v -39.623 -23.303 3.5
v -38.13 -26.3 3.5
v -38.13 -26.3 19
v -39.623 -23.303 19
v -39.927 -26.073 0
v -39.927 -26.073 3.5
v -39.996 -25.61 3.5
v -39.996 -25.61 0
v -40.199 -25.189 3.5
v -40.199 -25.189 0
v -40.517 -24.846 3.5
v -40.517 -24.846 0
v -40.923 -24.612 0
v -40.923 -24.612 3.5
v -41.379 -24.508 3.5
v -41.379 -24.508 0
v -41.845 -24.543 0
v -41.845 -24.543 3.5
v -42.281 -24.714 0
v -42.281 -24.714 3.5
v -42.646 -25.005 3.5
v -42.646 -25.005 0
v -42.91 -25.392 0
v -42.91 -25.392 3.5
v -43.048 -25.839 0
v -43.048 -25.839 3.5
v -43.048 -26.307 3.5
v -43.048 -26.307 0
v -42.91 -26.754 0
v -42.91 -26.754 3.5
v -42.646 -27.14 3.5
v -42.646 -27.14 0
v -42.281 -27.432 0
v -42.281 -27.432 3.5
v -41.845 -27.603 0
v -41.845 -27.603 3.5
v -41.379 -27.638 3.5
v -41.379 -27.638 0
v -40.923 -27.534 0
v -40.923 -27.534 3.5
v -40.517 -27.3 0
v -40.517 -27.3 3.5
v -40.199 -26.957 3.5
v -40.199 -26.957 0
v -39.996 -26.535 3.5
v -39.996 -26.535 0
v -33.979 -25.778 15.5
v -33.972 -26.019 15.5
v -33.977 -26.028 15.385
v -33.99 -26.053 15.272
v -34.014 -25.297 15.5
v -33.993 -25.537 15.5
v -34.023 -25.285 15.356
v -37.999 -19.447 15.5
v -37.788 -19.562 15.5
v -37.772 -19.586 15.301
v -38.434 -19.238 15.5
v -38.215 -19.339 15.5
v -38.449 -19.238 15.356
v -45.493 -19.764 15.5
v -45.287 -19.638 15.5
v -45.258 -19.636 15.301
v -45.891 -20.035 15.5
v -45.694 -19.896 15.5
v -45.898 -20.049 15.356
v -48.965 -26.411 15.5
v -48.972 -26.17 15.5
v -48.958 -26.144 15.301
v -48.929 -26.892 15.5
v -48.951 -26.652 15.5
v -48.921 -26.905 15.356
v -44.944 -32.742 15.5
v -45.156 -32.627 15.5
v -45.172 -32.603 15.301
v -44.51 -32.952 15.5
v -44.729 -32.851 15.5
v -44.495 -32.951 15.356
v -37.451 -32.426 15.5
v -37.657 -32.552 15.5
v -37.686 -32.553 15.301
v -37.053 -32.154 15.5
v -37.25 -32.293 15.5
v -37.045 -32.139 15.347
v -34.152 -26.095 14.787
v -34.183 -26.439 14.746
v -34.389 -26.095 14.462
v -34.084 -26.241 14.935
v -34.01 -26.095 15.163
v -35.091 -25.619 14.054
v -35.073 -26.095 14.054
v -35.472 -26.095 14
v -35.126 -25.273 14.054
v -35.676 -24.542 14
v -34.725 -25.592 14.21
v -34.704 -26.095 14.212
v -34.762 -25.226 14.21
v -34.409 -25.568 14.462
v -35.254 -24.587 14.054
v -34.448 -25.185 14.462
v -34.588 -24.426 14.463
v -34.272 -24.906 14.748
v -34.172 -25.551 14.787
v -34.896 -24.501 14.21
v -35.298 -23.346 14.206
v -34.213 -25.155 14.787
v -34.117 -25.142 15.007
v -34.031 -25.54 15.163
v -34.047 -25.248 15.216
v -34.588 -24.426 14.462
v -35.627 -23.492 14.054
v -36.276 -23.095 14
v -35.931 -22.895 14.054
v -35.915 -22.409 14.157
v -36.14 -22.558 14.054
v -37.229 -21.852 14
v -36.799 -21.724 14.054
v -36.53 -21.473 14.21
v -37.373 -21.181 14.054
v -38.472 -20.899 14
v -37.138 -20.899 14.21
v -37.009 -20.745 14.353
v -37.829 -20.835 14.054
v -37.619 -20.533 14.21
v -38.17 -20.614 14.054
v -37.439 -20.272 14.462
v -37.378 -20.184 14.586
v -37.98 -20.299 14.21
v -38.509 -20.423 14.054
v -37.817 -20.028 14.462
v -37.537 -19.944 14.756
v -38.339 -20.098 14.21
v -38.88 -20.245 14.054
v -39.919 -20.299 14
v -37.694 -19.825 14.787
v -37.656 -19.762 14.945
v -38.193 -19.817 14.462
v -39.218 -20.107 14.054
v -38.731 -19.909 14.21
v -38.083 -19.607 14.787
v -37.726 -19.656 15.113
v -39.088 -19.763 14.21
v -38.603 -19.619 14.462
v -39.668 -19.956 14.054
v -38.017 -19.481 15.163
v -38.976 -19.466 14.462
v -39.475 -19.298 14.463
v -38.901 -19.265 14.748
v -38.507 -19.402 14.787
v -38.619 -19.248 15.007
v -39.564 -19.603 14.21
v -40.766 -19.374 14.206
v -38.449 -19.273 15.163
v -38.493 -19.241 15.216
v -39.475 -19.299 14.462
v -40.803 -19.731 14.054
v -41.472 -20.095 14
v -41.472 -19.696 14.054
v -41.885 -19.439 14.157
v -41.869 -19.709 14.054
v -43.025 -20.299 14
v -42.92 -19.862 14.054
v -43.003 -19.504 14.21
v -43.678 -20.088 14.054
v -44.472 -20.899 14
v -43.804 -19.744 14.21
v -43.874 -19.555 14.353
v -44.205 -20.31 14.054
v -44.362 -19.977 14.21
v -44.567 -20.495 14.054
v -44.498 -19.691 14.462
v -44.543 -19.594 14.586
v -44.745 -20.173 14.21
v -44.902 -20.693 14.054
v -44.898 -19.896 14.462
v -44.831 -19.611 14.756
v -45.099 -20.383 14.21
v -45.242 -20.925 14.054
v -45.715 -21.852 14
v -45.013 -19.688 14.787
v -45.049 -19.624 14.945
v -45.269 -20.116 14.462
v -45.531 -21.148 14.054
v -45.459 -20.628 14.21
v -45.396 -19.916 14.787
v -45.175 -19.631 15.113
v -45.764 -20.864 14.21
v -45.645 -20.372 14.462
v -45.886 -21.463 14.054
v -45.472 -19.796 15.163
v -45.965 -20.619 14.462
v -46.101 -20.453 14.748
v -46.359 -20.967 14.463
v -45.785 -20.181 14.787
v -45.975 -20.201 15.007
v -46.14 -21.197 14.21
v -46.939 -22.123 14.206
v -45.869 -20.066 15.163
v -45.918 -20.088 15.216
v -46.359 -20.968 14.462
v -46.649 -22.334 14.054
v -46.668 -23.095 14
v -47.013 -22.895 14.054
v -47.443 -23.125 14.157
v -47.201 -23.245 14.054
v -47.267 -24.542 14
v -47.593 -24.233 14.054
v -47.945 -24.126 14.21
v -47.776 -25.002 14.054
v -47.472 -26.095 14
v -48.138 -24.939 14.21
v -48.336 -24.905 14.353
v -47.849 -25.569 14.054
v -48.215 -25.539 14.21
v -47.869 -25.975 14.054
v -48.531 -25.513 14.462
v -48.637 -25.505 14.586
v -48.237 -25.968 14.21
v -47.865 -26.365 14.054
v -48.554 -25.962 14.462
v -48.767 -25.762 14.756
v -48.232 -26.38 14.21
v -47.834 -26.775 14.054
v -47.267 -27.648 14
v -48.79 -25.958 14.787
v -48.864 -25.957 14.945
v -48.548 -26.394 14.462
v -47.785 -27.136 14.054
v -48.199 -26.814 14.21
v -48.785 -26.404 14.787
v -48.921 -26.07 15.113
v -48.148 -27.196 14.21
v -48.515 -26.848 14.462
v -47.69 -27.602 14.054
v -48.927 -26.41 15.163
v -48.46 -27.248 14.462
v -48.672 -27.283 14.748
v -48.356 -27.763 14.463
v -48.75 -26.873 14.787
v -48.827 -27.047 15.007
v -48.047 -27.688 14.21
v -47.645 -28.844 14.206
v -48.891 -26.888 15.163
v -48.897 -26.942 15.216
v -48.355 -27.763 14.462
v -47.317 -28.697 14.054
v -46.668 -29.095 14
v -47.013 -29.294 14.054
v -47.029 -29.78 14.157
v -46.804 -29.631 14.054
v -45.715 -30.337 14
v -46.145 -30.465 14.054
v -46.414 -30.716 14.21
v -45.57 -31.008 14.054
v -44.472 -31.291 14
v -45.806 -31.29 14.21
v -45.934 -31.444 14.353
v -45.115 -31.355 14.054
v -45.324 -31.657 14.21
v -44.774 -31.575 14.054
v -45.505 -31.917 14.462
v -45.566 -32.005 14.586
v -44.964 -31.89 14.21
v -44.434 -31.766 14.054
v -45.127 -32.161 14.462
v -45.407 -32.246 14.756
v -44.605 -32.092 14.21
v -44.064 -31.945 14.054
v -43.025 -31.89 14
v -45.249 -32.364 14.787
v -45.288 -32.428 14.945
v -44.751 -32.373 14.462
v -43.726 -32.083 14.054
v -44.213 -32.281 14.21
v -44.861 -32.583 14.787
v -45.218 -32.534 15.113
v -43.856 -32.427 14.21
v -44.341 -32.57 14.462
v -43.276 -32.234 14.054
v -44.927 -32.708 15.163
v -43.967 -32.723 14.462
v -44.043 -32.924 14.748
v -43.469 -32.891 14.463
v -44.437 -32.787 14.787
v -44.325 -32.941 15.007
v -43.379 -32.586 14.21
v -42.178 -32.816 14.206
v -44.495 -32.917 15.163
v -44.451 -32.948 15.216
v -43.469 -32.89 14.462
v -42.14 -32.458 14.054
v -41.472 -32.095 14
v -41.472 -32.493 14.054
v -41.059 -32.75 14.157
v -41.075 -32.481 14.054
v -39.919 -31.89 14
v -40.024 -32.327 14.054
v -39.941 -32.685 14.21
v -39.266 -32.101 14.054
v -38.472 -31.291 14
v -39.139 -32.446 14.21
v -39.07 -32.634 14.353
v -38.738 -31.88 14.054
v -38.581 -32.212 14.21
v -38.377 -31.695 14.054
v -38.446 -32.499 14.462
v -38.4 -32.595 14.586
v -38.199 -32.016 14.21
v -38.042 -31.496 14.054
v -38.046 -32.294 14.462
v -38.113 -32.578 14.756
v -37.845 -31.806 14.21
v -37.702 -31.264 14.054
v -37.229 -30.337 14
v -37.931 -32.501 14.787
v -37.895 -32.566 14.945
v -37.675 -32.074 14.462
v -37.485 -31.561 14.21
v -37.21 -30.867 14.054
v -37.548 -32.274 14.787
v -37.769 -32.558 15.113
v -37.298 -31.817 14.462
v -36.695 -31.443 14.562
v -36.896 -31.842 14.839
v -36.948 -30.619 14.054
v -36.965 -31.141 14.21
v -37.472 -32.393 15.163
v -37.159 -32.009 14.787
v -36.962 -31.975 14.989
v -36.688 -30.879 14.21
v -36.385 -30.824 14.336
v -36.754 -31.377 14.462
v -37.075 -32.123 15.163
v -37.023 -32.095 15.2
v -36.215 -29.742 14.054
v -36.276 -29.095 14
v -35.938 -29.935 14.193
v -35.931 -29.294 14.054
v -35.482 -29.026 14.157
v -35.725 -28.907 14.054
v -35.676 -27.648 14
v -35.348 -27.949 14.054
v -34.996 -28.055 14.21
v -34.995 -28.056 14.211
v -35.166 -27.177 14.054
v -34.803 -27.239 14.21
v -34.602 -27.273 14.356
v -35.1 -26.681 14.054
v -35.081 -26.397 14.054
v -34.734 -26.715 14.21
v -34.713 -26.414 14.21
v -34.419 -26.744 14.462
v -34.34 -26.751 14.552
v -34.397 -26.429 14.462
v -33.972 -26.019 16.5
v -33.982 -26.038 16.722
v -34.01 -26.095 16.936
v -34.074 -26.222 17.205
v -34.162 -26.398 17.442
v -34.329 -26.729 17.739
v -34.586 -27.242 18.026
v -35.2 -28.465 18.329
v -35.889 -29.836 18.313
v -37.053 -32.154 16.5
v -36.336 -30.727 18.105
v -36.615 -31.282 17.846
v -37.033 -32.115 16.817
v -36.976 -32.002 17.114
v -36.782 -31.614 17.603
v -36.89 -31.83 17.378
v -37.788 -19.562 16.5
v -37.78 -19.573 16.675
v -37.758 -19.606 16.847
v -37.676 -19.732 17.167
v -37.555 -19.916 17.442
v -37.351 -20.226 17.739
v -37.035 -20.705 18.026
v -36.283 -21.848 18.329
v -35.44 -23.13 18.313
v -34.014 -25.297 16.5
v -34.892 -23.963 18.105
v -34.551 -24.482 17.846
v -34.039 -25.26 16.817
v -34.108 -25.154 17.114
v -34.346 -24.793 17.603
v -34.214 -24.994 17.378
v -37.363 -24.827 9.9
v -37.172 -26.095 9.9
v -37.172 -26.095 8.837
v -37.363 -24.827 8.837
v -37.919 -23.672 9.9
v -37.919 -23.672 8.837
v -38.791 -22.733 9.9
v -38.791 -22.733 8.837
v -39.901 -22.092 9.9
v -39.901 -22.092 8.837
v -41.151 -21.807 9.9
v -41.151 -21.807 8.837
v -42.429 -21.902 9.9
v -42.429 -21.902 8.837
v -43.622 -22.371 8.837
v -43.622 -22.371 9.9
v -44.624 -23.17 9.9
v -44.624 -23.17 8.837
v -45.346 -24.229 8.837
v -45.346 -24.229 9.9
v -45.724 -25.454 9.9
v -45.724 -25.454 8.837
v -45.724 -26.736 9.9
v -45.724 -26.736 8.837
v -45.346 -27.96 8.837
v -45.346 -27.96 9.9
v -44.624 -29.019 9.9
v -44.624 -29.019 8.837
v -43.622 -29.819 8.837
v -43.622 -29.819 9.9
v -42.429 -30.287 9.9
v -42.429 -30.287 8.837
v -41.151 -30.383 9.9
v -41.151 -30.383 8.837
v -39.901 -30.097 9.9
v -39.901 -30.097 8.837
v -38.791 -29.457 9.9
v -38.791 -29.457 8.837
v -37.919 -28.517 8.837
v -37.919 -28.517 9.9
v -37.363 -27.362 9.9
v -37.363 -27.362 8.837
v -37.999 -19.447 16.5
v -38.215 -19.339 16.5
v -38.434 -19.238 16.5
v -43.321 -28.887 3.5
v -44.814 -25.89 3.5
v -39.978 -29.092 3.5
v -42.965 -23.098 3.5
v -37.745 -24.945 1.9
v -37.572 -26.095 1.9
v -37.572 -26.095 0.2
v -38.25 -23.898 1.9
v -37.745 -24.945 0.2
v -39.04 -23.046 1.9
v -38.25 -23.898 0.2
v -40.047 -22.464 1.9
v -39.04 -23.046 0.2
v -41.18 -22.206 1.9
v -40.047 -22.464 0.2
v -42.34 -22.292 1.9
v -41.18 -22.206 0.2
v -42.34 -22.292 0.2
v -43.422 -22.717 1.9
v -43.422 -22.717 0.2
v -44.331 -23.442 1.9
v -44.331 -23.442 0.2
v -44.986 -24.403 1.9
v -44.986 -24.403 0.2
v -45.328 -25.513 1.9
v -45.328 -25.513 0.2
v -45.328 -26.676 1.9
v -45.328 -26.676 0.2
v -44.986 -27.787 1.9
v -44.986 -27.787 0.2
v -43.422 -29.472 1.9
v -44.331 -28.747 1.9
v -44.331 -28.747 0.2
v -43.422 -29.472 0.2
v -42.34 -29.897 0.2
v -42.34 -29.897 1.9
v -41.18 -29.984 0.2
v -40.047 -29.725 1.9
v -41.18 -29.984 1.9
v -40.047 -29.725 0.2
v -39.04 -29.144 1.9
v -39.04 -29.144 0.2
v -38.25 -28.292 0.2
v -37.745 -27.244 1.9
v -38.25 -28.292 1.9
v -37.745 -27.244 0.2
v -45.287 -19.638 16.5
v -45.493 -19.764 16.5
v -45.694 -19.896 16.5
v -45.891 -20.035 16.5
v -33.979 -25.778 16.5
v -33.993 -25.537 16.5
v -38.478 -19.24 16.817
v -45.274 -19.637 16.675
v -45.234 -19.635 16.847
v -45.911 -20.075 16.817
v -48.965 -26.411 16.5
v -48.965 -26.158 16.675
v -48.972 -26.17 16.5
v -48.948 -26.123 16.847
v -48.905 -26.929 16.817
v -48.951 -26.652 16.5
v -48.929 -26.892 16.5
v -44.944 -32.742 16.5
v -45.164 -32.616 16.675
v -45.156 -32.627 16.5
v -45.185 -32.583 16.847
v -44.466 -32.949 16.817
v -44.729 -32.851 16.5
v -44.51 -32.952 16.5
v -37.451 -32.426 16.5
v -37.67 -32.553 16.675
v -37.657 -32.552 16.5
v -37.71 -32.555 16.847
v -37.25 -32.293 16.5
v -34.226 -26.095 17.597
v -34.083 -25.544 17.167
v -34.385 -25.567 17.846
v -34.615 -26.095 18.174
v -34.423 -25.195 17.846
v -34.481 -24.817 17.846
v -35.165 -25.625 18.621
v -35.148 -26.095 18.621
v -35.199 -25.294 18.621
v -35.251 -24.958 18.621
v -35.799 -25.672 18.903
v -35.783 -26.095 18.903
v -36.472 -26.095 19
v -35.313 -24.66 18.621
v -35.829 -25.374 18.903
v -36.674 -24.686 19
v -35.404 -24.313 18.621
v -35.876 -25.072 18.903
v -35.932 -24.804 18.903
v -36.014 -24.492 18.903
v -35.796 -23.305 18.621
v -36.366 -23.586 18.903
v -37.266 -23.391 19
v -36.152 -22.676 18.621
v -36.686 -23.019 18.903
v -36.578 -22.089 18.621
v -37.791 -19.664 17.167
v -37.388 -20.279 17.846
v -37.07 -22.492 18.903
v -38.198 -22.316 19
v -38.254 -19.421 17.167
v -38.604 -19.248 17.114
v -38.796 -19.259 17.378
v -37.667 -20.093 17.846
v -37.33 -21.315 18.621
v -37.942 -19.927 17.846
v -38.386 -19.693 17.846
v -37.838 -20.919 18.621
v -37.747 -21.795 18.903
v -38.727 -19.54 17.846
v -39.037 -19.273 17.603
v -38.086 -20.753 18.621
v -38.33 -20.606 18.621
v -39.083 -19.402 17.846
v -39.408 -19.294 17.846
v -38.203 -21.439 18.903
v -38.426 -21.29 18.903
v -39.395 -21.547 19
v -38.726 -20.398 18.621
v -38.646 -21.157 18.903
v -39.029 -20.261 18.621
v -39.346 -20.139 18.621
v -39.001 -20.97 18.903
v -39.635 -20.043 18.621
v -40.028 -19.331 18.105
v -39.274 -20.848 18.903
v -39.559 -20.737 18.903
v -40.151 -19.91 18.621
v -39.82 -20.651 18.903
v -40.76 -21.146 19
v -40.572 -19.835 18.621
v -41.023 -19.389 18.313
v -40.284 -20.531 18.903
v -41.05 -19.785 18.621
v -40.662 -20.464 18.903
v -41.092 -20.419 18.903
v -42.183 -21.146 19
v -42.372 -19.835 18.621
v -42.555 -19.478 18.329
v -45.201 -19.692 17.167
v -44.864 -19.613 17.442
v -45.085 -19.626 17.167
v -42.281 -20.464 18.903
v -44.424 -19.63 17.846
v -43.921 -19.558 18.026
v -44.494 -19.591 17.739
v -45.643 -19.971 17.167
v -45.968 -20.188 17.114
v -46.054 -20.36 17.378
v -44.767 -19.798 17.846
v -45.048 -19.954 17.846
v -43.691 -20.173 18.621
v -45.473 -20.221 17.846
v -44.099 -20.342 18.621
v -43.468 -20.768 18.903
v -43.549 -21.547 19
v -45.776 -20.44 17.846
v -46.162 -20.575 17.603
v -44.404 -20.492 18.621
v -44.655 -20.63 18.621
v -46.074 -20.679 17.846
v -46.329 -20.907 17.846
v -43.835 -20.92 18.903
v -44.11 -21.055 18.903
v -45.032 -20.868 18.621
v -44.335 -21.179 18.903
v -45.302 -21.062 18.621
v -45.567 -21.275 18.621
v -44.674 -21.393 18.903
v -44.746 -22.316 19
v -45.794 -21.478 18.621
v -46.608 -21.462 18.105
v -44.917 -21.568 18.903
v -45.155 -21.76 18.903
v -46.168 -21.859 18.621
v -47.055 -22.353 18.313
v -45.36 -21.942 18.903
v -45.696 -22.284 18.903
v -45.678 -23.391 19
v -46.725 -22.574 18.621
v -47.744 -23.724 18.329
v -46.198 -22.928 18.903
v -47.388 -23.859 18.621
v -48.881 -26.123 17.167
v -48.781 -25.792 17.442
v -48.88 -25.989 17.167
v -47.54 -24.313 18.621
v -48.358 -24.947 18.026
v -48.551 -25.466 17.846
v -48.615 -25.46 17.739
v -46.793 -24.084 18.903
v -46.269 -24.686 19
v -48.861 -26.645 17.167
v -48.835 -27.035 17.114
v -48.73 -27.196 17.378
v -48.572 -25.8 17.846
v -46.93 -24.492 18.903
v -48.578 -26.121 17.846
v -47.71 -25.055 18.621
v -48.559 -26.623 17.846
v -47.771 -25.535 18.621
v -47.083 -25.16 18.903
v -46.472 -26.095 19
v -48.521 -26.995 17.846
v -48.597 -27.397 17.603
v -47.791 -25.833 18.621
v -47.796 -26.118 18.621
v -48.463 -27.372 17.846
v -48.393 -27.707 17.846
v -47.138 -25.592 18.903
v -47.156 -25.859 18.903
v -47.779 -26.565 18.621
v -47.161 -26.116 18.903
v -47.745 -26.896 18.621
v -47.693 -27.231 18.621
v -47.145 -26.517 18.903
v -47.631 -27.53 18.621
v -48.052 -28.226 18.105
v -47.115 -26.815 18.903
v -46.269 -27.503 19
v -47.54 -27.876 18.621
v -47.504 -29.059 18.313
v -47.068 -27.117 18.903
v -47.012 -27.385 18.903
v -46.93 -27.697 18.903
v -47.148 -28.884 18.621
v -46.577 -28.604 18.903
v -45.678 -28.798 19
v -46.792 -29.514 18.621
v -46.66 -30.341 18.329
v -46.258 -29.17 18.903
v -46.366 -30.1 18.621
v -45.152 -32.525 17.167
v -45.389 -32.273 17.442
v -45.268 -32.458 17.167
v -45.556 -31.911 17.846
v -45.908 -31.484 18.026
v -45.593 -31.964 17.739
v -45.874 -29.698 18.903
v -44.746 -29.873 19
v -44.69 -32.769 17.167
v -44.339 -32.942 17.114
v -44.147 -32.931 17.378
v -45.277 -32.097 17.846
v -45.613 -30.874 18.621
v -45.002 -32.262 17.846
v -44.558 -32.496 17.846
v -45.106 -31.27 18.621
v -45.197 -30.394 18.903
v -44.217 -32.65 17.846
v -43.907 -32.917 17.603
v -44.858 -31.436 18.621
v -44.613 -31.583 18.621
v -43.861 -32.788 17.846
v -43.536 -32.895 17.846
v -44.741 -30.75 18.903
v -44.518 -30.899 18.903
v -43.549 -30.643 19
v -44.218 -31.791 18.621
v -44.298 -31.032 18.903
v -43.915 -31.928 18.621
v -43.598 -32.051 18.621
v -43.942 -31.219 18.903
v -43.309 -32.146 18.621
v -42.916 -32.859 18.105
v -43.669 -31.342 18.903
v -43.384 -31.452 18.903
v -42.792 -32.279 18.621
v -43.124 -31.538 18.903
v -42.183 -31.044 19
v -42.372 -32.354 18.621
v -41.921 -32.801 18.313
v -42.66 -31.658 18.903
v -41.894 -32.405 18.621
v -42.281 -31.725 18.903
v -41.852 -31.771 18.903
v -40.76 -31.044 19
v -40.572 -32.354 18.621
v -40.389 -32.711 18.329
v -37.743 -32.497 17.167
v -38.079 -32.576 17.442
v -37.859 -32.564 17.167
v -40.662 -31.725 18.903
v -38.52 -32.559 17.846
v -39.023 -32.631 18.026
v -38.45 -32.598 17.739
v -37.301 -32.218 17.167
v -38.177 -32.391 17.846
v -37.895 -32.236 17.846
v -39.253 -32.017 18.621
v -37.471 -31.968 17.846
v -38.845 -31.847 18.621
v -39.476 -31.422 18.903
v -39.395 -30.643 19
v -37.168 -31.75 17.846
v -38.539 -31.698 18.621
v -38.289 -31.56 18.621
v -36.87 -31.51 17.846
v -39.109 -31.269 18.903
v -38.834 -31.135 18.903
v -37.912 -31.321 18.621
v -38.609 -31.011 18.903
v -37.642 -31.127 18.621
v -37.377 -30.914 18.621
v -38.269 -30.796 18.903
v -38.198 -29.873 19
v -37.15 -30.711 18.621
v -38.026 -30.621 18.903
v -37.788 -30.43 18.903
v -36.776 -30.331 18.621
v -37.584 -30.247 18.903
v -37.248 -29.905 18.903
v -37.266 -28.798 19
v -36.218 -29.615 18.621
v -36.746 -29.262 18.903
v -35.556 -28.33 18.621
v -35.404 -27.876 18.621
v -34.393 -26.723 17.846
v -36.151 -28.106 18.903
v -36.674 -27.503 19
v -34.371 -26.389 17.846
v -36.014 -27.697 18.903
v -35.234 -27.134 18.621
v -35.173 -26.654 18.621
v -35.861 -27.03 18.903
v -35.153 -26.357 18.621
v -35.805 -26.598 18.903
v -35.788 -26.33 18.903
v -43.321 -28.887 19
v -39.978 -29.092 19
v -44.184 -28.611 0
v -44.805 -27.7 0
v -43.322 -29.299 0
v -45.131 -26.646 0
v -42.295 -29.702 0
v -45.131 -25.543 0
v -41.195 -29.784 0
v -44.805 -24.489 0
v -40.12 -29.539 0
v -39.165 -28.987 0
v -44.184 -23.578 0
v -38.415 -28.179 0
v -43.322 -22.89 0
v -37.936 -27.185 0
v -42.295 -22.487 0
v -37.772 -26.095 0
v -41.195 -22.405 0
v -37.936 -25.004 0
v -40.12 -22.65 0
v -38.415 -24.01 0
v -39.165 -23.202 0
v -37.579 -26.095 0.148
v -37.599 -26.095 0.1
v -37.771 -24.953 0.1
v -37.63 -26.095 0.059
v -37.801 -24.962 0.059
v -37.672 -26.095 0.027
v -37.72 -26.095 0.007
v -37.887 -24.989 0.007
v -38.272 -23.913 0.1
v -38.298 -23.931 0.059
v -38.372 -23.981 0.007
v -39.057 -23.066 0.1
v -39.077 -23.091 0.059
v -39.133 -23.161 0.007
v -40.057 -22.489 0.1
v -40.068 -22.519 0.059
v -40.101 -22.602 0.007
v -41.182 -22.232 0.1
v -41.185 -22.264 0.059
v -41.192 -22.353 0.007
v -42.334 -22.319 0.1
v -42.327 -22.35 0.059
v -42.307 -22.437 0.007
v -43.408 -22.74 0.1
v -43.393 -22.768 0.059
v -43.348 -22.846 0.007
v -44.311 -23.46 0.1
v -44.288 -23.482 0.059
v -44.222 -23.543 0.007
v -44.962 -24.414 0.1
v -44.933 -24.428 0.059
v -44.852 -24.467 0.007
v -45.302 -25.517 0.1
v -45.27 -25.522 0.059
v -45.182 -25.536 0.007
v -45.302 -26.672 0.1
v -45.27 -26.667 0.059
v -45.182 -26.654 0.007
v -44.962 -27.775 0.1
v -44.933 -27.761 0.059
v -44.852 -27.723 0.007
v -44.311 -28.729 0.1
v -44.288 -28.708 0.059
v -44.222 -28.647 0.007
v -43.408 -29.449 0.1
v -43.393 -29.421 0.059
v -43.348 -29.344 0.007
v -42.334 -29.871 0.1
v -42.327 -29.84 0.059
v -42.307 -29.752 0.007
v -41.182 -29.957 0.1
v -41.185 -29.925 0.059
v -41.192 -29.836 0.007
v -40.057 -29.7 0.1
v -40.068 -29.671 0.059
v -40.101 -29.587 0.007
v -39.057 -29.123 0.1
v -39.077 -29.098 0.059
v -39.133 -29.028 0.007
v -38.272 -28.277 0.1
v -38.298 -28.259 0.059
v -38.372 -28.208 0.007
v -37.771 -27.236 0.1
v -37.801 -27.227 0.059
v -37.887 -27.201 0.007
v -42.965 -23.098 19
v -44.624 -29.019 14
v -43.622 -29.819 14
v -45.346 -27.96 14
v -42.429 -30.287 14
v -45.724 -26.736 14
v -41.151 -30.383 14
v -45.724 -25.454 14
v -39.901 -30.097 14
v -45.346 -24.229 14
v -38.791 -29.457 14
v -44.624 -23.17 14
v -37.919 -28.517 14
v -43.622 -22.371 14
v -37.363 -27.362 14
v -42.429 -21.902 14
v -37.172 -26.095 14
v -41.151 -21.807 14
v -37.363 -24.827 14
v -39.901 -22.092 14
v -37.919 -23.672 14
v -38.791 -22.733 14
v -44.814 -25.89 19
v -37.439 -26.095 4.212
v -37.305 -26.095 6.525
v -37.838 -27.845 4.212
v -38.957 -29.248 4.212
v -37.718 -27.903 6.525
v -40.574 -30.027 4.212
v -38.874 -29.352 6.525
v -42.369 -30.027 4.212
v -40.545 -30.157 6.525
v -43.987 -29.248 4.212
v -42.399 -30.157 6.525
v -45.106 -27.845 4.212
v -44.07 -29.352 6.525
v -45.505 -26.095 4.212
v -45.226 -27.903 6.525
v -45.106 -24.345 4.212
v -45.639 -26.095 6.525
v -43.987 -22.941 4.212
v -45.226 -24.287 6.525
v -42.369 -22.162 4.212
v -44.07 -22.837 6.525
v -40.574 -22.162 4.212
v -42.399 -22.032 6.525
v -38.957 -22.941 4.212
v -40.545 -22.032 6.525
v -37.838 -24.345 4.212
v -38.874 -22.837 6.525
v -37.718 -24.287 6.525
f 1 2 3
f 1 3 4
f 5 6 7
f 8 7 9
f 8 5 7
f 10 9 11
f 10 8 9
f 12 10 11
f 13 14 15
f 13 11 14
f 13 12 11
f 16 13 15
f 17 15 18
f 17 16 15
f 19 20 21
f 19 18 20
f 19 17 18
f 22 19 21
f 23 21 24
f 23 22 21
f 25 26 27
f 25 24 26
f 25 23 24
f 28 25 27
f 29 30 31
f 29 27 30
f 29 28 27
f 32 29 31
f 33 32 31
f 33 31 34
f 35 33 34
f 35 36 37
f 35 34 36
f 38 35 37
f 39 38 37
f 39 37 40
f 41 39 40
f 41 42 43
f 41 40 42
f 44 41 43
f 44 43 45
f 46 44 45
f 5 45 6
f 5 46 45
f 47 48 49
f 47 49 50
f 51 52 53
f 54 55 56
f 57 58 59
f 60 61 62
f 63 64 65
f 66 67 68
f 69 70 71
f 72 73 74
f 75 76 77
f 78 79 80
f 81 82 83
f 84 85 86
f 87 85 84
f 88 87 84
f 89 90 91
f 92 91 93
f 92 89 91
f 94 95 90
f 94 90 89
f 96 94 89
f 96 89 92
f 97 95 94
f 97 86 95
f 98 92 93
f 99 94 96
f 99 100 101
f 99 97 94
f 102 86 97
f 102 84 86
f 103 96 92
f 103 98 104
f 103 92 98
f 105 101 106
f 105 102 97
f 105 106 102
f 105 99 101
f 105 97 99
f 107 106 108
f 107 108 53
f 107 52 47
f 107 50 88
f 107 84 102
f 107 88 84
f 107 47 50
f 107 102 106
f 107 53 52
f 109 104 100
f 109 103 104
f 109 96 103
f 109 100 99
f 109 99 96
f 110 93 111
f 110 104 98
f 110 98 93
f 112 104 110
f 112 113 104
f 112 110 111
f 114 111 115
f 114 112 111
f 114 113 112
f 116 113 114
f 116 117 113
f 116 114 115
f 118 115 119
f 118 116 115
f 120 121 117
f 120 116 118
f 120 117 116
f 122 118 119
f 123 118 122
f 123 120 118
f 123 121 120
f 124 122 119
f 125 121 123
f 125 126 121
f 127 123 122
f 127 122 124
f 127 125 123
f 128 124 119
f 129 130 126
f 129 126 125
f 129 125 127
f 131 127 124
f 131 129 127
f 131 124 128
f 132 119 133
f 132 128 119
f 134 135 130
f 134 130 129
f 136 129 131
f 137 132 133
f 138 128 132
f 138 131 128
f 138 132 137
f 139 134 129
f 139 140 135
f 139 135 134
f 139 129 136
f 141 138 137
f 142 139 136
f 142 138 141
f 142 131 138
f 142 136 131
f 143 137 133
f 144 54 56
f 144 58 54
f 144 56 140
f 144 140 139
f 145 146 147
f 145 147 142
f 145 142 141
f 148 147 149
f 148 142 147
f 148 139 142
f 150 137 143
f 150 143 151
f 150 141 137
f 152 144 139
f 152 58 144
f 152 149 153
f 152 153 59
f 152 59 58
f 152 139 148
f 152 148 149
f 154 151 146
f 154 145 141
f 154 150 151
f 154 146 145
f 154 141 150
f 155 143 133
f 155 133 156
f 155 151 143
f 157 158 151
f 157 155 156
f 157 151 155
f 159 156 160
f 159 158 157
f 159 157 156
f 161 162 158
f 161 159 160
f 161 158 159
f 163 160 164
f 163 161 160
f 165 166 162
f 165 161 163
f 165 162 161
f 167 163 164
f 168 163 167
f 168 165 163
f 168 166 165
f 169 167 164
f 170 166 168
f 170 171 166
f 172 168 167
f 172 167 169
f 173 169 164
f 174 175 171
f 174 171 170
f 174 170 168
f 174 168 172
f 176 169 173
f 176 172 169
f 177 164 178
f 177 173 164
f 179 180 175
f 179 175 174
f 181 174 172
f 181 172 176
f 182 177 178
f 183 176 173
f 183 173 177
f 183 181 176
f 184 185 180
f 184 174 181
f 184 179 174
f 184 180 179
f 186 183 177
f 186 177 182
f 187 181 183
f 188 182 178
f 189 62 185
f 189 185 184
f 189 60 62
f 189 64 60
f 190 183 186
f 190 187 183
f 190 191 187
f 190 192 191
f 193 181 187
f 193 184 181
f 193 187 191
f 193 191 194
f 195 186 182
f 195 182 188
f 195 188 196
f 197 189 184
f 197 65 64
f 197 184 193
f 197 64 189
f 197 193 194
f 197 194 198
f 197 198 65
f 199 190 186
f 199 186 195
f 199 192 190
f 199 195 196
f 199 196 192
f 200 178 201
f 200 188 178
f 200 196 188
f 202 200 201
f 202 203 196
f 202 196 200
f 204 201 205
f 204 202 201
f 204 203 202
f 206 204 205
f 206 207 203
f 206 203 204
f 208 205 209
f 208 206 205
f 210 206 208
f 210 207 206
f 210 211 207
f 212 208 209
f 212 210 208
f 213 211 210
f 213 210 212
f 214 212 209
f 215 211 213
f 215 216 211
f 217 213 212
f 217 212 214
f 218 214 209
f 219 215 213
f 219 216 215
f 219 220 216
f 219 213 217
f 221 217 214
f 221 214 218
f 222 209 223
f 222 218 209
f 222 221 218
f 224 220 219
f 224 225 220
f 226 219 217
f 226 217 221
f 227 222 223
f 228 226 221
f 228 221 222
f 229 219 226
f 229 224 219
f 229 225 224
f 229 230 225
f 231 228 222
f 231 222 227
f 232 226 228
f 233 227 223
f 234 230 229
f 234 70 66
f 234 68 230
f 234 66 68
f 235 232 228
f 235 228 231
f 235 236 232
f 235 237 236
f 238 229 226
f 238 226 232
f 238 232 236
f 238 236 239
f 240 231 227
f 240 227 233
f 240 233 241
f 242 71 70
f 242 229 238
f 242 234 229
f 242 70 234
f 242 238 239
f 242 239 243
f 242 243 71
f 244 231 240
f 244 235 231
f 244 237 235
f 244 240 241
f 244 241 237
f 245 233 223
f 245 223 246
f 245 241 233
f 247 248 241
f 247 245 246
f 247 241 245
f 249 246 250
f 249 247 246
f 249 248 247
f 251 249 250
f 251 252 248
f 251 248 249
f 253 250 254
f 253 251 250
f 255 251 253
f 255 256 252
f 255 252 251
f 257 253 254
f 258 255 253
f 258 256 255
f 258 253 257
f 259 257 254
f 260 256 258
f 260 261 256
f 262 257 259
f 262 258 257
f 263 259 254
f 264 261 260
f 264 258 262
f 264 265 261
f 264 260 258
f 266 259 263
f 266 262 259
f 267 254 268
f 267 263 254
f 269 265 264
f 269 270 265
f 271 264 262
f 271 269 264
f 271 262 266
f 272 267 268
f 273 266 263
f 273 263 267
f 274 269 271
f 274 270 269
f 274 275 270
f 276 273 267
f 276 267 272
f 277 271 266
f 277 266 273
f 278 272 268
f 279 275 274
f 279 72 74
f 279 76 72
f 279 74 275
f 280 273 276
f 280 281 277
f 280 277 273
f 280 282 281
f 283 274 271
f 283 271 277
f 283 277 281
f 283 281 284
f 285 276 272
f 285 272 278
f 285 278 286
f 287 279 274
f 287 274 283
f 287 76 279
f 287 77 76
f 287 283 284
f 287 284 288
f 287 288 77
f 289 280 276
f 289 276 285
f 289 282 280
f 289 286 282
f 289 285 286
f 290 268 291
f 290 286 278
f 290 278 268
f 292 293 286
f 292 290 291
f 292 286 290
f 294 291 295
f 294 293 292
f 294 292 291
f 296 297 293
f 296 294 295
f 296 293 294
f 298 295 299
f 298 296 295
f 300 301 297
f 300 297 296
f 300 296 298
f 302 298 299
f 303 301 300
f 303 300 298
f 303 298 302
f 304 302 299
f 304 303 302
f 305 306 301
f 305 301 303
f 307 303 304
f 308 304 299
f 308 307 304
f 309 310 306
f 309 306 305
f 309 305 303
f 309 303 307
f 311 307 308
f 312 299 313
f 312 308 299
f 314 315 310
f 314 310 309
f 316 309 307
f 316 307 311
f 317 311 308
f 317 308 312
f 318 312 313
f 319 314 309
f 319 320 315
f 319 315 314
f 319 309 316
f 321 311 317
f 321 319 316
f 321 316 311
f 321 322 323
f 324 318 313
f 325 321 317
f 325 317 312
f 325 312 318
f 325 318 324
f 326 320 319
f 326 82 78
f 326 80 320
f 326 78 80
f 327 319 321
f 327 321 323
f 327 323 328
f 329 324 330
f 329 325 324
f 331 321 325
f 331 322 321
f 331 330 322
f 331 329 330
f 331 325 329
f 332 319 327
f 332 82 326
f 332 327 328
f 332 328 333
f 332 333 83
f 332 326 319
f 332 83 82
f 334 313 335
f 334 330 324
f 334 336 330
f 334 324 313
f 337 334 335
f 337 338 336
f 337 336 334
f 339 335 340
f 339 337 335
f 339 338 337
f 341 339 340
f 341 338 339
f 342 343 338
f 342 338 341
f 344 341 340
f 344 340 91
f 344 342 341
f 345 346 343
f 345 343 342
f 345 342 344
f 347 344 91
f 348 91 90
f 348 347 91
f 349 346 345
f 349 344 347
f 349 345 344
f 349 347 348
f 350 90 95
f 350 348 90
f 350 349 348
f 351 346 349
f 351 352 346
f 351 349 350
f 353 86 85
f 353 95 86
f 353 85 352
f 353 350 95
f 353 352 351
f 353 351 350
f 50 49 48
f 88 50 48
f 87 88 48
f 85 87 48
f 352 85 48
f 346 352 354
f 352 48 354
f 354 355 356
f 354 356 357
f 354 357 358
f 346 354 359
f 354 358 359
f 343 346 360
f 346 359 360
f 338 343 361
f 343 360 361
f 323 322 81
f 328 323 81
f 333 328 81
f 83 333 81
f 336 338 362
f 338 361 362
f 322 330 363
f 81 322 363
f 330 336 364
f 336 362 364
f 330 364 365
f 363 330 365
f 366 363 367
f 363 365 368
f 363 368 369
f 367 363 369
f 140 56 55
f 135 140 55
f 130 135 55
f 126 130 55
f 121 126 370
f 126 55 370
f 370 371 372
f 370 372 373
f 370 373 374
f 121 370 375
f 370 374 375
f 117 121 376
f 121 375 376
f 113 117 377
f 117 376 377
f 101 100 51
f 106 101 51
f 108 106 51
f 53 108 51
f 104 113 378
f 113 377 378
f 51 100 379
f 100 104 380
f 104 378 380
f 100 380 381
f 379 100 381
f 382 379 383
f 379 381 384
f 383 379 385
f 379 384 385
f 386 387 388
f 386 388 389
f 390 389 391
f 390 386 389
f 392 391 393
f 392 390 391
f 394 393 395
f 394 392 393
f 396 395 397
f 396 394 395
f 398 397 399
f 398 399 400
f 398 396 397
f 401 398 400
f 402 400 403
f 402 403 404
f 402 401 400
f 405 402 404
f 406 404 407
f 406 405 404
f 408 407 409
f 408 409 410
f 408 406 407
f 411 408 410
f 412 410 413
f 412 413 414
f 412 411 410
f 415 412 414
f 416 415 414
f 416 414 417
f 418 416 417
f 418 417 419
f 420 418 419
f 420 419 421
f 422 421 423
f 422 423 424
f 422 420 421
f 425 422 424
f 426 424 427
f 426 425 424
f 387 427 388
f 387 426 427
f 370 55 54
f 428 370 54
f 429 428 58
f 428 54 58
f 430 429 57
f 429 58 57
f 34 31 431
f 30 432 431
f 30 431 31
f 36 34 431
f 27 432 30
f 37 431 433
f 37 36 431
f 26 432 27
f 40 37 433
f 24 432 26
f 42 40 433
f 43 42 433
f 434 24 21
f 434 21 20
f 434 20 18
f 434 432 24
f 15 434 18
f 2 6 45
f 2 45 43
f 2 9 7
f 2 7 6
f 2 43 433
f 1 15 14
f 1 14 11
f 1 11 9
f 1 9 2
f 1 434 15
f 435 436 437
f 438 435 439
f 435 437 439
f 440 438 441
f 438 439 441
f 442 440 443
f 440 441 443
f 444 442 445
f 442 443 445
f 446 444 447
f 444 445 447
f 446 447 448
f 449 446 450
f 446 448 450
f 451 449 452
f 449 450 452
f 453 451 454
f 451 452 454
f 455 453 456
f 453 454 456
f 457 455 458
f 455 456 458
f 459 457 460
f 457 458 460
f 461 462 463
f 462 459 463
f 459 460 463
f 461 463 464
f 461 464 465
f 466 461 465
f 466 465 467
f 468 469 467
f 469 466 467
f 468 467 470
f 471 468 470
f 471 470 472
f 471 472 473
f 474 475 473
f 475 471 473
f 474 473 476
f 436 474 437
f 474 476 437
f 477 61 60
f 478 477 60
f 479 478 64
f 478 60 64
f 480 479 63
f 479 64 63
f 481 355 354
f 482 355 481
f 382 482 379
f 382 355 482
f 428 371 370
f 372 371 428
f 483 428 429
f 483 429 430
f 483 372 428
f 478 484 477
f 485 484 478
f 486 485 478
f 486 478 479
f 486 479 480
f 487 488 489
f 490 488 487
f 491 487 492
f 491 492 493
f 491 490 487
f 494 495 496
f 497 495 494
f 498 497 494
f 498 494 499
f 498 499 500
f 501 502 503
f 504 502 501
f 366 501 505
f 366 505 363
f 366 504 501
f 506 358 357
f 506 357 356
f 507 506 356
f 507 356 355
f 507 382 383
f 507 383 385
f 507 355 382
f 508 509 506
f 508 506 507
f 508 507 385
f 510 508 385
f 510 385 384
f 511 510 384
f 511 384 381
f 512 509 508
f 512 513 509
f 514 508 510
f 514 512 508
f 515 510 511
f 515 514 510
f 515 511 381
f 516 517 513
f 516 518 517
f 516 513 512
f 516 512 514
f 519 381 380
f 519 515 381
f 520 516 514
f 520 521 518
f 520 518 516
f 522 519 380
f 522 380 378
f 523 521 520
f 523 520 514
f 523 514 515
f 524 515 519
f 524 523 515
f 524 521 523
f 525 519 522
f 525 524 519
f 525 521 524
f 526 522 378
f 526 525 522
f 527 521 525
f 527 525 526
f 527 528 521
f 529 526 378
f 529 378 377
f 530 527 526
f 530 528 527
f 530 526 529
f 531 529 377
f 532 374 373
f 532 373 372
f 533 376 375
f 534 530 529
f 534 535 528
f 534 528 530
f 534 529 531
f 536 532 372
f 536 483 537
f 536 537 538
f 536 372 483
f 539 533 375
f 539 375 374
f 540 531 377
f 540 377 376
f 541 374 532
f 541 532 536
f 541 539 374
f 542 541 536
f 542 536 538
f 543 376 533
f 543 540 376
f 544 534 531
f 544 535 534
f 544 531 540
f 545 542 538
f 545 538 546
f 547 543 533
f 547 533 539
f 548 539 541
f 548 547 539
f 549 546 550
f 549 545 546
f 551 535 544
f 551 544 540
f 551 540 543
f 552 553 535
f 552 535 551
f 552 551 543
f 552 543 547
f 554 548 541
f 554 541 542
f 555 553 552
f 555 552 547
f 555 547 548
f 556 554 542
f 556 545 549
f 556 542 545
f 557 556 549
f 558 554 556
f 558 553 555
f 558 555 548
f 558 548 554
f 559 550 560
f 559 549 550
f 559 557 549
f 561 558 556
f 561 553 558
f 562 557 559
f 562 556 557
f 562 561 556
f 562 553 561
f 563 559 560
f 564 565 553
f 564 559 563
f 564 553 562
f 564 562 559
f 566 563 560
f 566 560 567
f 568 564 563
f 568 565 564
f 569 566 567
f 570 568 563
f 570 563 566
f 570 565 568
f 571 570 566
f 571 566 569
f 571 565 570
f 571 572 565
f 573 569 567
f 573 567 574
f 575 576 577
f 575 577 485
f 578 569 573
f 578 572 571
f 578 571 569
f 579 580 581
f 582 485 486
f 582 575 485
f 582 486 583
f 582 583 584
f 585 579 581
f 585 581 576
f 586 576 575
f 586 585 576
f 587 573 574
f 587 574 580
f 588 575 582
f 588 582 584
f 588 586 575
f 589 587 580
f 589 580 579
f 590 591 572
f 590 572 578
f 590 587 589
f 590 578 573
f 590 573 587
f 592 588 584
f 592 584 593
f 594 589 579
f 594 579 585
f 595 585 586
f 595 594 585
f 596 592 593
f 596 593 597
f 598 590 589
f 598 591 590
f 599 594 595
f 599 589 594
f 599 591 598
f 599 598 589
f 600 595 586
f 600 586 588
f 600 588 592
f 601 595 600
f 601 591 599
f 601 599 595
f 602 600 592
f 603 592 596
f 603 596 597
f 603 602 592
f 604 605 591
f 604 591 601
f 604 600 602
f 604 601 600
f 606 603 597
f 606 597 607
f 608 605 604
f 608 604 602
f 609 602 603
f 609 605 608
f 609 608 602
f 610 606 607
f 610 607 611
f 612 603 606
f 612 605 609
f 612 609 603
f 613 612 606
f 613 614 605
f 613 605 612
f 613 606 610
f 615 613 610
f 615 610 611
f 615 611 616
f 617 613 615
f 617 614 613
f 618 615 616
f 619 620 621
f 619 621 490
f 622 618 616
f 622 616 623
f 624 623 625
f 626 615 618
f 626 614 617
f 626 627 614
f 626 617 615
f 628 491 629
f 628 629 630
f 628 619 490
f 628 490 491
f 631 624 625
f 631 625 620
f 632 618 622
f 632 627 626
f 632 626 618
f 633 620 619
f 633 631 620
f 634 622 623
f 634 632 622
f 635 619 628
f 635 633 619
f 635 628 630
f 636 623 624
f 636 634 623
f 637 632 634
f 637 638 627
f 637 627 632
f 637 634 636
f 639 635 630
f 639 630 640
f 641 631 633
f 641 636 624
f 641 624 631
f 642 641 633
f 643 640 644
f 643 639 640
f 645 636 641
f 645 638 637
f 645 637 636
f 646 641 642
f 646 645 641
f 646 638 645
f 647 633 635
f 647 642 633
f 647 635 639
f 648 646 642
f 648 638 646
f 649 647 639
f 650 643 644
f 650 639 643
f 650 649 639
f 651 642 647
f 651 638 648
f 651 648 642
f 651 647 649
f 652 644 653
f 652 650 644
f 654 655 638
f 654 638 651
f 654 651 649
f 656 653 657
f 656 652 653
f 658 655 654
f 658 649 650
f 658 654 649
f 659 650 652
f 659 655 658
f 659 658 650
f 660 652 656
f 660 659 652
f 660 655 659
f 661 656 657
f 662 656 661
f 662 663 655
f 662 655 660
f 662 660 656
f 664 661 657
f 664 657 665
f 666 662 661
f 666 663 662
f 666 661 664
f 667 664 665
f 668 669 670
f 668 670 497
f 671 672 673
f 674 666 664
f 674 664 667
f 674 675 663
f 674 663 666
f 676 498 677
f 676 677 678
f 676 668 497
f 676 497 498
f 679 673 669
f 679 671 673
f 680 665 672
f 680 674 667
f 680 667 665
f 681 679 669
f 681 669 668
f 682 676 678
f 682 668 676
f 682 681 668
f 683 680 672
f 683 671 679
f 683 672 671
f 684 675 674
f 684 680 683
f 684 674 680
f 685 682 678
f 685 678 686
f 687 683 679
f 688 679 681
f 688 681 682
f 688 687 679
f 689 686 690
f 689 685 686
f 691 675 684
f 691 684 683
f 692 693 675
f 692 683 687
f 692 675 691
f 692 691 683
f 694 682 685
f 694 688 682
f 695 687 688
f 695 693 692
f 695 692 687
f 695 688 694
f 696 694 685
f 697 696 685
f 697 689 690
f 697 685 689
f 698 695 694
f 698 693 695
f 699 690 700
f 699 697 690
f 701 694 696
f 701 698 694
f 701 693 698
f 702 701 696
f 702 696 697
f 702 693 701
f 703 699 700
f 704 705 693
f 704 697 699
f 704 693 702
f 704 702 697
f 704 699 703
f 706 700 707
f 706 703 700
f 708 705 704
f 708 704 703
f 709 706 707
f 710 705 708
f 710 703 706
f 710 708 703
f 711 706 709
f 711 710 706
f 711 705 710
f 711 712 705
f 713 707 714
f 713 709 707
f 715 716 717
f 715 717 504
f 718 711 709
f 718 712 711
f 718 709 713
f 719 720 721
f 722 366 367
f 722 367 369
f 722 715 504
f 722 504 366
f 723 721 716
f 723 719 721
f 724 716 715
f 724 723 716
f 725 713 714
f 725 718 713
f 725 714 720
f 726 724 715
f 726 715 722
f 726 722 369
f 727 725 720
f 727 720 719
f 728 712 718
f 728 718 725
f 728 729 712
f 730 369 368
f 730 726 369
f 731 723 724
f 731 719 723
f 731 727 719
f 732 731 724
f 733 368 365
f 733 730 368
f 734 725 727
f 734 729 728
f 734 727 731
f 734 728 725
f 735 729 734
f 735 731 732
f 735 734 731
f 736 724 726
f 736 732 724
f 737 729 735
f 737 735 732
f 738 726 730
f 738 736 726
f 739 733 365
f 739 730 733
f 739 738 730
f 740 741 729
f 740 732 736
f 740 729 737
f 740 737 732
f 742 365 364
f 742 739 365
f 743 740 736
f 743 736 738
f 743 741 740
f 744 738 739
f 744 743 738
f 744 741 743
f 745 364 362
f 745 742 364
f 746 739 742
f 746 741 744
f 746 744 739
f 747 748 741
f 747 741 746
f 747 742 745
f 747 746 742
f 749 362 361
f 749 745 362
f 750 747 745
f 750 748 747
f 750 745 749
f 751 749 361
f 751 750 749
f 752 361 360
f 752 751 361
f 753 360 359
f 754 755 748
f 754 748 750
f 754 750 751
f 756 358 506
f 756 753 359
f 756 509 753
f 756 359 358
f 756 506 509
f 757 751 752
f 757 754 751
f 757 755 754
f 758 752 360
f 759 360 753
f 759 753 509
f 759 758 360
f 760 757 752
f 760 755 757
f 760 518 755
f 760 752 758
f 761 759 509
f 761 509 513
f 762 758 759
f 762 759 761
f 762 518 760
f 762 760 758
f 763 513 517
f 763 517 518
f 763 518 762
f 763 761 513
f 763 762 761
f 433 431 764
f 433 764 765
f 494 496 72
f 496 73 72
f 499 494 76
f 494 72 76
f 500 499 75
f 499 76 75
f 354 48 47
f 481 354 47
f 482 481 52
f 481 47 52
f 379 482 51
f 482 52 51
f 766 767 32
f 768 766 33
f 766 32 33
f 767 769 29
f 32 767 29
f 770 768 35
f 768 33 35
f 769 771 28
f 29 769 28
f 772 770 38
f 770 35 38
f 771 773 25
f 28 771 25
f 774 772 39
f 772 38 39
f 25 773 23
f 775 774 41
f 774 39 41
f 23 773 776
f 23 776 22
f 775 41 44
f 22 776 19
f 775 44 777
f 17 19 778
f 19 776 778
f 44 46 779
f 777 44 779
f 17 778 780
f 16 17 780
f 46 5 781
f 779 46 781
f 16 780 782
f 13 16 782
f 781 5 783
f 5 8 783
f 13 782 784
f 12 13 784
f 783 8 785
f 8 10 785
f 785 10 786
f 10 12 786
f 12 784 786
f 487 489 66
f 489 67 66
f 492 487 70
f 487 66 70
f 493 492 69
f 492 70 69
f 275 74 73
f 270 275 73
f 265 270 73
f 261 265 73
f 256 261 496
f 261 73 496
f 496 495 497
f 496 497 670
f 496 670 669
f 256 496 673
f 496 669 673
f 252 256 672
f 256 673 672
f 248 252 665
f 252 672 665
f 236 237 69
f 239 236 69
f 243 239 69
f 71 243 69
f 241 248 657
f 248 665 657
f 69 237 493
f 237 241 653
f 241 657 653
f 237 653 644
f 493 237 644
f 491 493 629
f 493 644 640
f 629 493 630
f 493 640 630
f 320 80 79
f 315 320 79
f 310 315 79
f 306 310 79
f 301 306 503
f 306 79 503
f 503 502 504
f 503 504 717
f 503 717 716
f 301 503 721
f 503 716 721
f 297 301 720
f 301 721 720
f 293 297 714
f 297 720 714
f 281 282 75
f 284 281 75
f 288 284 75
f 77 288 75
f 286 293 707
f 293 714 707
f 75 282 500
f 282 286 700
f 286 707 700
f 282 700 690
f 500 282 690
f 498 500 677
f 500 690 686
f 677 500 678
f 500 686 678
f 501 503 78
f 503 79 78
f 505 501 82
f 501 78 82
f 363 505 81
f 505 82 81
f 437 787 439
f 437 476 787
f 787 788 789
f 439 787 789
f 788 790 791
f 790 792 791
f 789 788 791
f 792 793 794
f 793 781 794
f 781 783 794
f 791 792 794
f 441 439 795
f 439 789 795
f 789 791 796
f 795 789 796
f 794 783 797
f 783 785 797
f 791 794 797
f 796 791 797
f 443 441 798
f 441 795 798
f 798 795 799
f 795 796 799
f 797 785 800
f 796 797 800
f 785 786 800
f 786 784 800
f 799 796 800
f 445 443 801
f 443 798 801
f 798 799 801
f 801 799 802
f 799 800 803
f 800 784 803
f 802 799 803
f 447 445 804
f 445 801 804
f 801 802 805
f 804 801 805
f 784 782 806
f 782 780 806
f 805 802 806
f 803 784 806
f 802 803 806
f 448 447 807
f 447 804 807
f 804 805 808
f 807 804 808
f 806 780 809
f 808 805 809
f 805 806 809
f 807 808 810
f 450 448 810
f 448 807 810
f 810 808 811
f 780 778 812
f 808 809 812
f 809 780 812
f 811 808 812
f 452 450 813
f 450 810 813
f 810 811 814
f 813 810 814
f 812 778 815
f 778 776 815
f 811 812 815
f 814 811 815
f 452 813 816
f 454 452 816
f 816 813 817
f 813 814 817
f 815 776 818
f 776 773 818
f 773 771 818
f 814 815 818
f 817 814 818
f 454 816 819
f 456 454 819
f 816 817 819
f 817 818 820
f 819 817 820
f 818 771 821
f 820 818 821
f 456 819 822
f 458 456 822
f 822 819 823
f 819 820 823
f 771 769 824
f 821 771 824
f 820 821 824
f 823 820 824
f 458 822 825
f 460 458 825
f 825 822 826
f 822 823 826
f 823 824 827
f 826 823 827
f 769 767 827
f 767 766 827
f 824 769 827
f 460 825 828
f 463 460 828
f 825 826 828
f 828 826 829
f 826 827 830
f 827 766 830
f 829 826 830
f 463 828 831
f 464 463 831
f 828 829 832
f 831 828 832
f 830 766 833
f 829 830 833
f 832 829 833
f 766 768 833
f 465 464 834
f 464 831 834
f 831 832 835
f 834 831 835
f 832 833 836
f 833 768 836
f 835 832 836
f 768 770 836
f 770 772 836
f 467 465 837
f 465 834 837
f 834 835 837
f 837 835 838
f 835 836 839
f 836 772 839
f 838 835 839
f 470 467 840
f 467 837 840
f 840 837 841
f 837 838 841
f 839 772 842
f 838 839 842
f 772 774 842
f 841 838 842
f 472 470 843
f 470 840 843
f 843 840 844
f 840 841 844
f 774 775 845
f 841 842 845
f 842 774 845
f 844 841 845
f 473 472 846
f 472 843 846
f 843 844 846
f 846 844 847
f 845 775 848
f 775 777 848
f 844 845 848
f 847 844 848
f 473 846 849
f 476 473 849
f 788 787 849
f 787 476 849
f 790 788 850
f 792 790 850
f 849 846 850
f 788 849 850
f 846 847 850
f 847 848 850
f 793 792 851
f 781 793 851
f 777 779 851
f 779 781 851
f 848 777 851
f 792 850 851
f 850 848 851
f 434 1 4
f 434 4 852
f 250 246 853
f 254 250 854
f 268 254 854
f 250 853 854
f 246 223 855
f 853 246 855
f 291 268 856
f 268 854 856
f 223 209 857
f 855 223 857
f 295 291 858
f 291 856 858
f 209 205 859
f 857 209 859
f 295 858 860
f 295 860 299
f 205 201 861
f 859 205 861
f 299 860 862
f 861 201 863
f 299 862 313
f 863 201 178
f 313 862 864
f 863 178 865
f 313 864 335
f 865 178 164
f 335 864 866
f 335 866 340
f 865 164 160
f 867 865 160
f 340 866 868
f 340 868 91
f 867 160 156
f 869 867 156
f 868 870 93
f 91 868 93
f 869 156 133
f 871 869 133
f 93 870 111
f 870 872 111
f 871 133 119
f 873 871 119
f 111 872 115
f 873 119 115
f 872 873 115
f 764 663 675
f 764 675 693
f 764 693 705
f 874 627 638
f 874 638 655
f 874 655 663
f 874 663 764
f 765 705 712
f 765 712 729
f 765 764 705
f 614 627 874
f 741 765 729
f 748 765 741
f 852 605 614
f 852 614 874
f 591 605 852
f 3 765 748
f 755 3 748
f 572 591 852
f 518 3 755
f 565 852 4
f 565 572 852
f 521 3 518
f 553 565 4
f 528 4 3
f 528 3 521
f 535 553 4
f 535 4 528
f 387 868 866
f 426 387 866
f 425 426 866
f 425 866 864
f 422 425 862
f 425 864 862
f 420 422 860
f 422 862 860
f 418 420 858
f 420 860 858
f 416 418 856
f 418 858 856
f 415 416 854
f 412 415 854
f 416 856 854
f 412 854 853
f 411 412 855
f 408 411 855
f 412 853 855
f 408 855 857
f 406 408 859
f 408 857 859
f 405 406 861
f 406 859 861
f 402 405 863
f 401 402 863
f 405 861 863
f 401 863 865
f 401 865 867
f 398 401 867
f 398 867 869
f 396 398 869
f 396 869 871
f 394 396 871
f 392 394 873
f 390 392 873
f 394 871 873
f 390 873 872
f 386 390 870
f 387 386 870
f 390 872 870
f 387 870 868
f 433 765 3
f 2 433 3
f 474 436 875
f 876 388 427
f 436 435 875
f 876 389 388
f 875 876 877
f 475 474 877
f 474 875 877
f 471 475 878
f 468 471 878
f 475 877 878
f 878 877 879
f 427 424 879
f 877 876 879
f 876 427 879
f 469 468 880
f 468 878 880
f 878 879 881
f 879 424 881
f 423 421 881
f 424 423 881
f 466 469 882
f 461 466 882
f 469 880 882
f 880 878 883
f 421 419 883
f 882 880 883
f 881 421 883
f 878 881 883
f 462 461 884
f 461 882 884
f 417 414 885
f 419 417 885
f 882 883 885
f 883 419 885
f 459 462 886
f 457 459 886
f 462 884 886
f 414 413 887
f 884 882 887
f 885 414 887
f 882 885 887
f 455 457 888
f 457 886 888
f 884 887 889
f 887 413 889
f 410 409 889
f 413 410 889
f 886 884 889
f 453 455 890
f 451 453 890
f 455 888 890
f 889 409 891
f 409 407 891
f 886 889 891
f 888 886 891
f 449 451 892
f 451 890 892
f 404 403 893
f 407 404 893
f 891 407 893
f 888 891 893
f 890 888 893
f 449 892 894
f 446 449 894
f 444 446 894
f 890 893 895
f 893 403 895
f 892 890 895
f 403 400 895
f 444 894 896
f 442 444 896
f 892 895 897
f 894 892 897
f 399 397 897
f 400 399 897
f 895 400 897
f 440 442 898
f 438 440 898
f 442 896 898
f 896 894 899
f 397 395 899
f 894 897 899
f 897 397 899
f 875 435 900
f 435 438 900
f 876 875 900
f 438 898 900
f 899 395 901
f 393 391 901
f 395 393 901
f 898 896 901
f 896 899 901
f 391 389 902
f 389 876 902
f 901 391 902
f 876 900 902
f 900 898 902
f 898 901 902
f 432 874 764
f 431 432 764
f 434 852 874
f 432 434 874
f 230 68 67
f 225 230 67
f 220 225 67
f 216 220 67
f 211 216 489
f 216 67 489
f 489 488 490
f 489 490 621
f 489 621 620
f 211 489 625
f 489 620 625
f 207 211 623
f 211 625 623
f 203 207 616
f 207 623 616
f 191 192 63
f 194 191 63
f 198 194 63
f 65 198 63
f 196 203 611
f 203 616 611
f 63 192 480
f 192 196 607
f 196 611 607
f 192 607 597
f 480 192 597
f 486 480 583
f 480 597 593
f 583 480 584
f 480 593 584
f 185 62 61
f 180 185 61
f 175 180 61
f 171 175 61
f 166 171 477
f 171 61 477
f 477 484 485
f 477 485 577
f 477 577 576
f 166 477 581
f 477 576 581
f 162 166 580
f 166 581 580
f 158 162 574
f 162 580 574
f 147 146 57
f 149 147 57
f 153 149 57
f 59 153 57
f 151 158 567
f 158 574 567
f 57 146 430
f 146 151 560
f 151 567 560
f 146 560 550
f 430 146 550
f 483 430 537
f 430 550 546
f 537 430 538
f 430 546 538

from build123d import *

# Parameters (mm, degrees)
F0_R         = 3.9
F2_DEPTH     = 14
F3_R         = 7.5
F4_DEPTH     = 5
F6_R         = 4.3
F7_DEPTH     = 4.1
F1_R         = 1.5693660879
F8_DEPTH     = 23.4
F9_DEPTH     = 15.5
F10_R        = 0.2
F11_S5_R     = 4.3
F11_T6_DEPTH = 9
F12_R        = 1.5
F13_R        = 2.5
F15_R        = 8.6051956913
F16_DEPTH    = 6


# Not quite as in the source:
# - a fillet or chamfer that OpenCascade refuses, or shapes differently, is made with other operations: its cross-section is extruded or revolved along the edge and cut away or added


with BuildPart() as f2:
    # F0 (on Top) → F2 (new body)
    with BuildSketch(Plane.XY):
        with Locations((-41.4718948305, -26.0946750641)):
            Circle(F0_R)
    extrude(amount=F2_DEPTH)

    # F3 (on face) → F4 (join)
    with BuildSketch(Plane.XY.offset(14)):
        with Locations((-41.4718948305, -26.0946750641)):
            Circle(F3_R)
    extrude(amount=F4_DEPTH)

    # F6 (on face) → F7 (join)
    with BuildSketch(Plane(origin=(0, 0, 14), x_dir=(1, 0, 0), z_dir=(0, 0, -1))):
        with Locations((-41.4718948305, 26.0946750641)):
            Circle(F6_R)
    extrude(amount=F7_DEPTH)

    # F1 (on Top) → F8 (cut)
    with BuildSketch(Plane.XY):
        with Locations((-41.495975107, -26.0728988796)):
            Circle(F1_R)
    extrude(amount=F8_DEPTH, mode=Mode.SUBTRACT)

    # F5 (on face) → F9 (cut)
    with BuildSketch(Plane.XY.offset(19)):
        Polygon((-39.9783341683, -29.0917753096), (-38.1295495491, -26.2997637113), (-39.6231102113, -23.3026634658), (-42.9654554927, -23.0975748186), (-44.8142401119, -25.8895864169), (-43.3206794497, -28.8866866624), align=None)
    extrude(amount=-F9_DEPTH, mode=Mode.SUBTRACT)

    # F10
    f10_edges = [f2.edges().sort_by_distance(p)[0] for p in [
        (-45.371895, -26.094675, 0),
    ]]
    fillet(f10_edges, radius=F10_R)

    # F11: chamfer of 8 x 0.4612770977 on 1 edges, made by hand


with BuildPart() as f11_tool2:
    # F11_s3 → F11_t4 (revolve)
    with BuildSketch(Plane.XZ.offset(26.0946750641)):
        Polygon((-37.5718948305, 1.9), (-37.1106177328, 9.9), (-37.5718948305, 9.9), align=None)
    revolve(axis=Axis((-41.4718948305, -26.0946750641, 9.9), (0, 0, -1)))

    # F11_s5 → F11_t6 (intersect, symmetric)
    with BuildSketch(Plane.XY.offset(5.9)):
        with Locations((-41.4718948305, -26.0946750641)):
            Circle(F11_S5_R)
    extrude(amount=F11_T6_DEPTH, both=True, mode=Mode.INTERSECT)


with BuildPart() as f2_1:
    add(f2.part)

    # F11_t1: union F11_tool2
    add(f11_tool2.part)

    # F12
    f12_edges = [f2_1.edges().sort_by_distance(p)[0] for p in [
        (-48.971895, -26.094675, 14),
    ]]
    fillet(f12_edges, radius=F12_R)

    # F13
    f13_edges = [f2_1.edges().sort_by_distance(p)[0] for p in [
        (-48.971895, -26.094675, 19),
    ]]
    fillet(f13_edges, radius=F13_R)

    # F15 (on face) → F16 (cut)
    with BuildSketch(Plane.XY.offset(19)):
        with Locations((-41.4718948305, -26.0946750641)):
            Circle(F15_R)
        Polygon((-49.1588137584, -26.5433145587), (-45.7038874939, -19.661927743), (-38.016968566, -19.2132882484), (-33.7849759026, -25.6460355695), (-37.2399021671, -32.5274223852), (-44.926821095, -32.9760618798), align=None, mode=Mode.SUBTRACT)
    extrude(amount=-F16_DEPTH, mode=Mode.SUBTRACT)


solid = f2_1.part
